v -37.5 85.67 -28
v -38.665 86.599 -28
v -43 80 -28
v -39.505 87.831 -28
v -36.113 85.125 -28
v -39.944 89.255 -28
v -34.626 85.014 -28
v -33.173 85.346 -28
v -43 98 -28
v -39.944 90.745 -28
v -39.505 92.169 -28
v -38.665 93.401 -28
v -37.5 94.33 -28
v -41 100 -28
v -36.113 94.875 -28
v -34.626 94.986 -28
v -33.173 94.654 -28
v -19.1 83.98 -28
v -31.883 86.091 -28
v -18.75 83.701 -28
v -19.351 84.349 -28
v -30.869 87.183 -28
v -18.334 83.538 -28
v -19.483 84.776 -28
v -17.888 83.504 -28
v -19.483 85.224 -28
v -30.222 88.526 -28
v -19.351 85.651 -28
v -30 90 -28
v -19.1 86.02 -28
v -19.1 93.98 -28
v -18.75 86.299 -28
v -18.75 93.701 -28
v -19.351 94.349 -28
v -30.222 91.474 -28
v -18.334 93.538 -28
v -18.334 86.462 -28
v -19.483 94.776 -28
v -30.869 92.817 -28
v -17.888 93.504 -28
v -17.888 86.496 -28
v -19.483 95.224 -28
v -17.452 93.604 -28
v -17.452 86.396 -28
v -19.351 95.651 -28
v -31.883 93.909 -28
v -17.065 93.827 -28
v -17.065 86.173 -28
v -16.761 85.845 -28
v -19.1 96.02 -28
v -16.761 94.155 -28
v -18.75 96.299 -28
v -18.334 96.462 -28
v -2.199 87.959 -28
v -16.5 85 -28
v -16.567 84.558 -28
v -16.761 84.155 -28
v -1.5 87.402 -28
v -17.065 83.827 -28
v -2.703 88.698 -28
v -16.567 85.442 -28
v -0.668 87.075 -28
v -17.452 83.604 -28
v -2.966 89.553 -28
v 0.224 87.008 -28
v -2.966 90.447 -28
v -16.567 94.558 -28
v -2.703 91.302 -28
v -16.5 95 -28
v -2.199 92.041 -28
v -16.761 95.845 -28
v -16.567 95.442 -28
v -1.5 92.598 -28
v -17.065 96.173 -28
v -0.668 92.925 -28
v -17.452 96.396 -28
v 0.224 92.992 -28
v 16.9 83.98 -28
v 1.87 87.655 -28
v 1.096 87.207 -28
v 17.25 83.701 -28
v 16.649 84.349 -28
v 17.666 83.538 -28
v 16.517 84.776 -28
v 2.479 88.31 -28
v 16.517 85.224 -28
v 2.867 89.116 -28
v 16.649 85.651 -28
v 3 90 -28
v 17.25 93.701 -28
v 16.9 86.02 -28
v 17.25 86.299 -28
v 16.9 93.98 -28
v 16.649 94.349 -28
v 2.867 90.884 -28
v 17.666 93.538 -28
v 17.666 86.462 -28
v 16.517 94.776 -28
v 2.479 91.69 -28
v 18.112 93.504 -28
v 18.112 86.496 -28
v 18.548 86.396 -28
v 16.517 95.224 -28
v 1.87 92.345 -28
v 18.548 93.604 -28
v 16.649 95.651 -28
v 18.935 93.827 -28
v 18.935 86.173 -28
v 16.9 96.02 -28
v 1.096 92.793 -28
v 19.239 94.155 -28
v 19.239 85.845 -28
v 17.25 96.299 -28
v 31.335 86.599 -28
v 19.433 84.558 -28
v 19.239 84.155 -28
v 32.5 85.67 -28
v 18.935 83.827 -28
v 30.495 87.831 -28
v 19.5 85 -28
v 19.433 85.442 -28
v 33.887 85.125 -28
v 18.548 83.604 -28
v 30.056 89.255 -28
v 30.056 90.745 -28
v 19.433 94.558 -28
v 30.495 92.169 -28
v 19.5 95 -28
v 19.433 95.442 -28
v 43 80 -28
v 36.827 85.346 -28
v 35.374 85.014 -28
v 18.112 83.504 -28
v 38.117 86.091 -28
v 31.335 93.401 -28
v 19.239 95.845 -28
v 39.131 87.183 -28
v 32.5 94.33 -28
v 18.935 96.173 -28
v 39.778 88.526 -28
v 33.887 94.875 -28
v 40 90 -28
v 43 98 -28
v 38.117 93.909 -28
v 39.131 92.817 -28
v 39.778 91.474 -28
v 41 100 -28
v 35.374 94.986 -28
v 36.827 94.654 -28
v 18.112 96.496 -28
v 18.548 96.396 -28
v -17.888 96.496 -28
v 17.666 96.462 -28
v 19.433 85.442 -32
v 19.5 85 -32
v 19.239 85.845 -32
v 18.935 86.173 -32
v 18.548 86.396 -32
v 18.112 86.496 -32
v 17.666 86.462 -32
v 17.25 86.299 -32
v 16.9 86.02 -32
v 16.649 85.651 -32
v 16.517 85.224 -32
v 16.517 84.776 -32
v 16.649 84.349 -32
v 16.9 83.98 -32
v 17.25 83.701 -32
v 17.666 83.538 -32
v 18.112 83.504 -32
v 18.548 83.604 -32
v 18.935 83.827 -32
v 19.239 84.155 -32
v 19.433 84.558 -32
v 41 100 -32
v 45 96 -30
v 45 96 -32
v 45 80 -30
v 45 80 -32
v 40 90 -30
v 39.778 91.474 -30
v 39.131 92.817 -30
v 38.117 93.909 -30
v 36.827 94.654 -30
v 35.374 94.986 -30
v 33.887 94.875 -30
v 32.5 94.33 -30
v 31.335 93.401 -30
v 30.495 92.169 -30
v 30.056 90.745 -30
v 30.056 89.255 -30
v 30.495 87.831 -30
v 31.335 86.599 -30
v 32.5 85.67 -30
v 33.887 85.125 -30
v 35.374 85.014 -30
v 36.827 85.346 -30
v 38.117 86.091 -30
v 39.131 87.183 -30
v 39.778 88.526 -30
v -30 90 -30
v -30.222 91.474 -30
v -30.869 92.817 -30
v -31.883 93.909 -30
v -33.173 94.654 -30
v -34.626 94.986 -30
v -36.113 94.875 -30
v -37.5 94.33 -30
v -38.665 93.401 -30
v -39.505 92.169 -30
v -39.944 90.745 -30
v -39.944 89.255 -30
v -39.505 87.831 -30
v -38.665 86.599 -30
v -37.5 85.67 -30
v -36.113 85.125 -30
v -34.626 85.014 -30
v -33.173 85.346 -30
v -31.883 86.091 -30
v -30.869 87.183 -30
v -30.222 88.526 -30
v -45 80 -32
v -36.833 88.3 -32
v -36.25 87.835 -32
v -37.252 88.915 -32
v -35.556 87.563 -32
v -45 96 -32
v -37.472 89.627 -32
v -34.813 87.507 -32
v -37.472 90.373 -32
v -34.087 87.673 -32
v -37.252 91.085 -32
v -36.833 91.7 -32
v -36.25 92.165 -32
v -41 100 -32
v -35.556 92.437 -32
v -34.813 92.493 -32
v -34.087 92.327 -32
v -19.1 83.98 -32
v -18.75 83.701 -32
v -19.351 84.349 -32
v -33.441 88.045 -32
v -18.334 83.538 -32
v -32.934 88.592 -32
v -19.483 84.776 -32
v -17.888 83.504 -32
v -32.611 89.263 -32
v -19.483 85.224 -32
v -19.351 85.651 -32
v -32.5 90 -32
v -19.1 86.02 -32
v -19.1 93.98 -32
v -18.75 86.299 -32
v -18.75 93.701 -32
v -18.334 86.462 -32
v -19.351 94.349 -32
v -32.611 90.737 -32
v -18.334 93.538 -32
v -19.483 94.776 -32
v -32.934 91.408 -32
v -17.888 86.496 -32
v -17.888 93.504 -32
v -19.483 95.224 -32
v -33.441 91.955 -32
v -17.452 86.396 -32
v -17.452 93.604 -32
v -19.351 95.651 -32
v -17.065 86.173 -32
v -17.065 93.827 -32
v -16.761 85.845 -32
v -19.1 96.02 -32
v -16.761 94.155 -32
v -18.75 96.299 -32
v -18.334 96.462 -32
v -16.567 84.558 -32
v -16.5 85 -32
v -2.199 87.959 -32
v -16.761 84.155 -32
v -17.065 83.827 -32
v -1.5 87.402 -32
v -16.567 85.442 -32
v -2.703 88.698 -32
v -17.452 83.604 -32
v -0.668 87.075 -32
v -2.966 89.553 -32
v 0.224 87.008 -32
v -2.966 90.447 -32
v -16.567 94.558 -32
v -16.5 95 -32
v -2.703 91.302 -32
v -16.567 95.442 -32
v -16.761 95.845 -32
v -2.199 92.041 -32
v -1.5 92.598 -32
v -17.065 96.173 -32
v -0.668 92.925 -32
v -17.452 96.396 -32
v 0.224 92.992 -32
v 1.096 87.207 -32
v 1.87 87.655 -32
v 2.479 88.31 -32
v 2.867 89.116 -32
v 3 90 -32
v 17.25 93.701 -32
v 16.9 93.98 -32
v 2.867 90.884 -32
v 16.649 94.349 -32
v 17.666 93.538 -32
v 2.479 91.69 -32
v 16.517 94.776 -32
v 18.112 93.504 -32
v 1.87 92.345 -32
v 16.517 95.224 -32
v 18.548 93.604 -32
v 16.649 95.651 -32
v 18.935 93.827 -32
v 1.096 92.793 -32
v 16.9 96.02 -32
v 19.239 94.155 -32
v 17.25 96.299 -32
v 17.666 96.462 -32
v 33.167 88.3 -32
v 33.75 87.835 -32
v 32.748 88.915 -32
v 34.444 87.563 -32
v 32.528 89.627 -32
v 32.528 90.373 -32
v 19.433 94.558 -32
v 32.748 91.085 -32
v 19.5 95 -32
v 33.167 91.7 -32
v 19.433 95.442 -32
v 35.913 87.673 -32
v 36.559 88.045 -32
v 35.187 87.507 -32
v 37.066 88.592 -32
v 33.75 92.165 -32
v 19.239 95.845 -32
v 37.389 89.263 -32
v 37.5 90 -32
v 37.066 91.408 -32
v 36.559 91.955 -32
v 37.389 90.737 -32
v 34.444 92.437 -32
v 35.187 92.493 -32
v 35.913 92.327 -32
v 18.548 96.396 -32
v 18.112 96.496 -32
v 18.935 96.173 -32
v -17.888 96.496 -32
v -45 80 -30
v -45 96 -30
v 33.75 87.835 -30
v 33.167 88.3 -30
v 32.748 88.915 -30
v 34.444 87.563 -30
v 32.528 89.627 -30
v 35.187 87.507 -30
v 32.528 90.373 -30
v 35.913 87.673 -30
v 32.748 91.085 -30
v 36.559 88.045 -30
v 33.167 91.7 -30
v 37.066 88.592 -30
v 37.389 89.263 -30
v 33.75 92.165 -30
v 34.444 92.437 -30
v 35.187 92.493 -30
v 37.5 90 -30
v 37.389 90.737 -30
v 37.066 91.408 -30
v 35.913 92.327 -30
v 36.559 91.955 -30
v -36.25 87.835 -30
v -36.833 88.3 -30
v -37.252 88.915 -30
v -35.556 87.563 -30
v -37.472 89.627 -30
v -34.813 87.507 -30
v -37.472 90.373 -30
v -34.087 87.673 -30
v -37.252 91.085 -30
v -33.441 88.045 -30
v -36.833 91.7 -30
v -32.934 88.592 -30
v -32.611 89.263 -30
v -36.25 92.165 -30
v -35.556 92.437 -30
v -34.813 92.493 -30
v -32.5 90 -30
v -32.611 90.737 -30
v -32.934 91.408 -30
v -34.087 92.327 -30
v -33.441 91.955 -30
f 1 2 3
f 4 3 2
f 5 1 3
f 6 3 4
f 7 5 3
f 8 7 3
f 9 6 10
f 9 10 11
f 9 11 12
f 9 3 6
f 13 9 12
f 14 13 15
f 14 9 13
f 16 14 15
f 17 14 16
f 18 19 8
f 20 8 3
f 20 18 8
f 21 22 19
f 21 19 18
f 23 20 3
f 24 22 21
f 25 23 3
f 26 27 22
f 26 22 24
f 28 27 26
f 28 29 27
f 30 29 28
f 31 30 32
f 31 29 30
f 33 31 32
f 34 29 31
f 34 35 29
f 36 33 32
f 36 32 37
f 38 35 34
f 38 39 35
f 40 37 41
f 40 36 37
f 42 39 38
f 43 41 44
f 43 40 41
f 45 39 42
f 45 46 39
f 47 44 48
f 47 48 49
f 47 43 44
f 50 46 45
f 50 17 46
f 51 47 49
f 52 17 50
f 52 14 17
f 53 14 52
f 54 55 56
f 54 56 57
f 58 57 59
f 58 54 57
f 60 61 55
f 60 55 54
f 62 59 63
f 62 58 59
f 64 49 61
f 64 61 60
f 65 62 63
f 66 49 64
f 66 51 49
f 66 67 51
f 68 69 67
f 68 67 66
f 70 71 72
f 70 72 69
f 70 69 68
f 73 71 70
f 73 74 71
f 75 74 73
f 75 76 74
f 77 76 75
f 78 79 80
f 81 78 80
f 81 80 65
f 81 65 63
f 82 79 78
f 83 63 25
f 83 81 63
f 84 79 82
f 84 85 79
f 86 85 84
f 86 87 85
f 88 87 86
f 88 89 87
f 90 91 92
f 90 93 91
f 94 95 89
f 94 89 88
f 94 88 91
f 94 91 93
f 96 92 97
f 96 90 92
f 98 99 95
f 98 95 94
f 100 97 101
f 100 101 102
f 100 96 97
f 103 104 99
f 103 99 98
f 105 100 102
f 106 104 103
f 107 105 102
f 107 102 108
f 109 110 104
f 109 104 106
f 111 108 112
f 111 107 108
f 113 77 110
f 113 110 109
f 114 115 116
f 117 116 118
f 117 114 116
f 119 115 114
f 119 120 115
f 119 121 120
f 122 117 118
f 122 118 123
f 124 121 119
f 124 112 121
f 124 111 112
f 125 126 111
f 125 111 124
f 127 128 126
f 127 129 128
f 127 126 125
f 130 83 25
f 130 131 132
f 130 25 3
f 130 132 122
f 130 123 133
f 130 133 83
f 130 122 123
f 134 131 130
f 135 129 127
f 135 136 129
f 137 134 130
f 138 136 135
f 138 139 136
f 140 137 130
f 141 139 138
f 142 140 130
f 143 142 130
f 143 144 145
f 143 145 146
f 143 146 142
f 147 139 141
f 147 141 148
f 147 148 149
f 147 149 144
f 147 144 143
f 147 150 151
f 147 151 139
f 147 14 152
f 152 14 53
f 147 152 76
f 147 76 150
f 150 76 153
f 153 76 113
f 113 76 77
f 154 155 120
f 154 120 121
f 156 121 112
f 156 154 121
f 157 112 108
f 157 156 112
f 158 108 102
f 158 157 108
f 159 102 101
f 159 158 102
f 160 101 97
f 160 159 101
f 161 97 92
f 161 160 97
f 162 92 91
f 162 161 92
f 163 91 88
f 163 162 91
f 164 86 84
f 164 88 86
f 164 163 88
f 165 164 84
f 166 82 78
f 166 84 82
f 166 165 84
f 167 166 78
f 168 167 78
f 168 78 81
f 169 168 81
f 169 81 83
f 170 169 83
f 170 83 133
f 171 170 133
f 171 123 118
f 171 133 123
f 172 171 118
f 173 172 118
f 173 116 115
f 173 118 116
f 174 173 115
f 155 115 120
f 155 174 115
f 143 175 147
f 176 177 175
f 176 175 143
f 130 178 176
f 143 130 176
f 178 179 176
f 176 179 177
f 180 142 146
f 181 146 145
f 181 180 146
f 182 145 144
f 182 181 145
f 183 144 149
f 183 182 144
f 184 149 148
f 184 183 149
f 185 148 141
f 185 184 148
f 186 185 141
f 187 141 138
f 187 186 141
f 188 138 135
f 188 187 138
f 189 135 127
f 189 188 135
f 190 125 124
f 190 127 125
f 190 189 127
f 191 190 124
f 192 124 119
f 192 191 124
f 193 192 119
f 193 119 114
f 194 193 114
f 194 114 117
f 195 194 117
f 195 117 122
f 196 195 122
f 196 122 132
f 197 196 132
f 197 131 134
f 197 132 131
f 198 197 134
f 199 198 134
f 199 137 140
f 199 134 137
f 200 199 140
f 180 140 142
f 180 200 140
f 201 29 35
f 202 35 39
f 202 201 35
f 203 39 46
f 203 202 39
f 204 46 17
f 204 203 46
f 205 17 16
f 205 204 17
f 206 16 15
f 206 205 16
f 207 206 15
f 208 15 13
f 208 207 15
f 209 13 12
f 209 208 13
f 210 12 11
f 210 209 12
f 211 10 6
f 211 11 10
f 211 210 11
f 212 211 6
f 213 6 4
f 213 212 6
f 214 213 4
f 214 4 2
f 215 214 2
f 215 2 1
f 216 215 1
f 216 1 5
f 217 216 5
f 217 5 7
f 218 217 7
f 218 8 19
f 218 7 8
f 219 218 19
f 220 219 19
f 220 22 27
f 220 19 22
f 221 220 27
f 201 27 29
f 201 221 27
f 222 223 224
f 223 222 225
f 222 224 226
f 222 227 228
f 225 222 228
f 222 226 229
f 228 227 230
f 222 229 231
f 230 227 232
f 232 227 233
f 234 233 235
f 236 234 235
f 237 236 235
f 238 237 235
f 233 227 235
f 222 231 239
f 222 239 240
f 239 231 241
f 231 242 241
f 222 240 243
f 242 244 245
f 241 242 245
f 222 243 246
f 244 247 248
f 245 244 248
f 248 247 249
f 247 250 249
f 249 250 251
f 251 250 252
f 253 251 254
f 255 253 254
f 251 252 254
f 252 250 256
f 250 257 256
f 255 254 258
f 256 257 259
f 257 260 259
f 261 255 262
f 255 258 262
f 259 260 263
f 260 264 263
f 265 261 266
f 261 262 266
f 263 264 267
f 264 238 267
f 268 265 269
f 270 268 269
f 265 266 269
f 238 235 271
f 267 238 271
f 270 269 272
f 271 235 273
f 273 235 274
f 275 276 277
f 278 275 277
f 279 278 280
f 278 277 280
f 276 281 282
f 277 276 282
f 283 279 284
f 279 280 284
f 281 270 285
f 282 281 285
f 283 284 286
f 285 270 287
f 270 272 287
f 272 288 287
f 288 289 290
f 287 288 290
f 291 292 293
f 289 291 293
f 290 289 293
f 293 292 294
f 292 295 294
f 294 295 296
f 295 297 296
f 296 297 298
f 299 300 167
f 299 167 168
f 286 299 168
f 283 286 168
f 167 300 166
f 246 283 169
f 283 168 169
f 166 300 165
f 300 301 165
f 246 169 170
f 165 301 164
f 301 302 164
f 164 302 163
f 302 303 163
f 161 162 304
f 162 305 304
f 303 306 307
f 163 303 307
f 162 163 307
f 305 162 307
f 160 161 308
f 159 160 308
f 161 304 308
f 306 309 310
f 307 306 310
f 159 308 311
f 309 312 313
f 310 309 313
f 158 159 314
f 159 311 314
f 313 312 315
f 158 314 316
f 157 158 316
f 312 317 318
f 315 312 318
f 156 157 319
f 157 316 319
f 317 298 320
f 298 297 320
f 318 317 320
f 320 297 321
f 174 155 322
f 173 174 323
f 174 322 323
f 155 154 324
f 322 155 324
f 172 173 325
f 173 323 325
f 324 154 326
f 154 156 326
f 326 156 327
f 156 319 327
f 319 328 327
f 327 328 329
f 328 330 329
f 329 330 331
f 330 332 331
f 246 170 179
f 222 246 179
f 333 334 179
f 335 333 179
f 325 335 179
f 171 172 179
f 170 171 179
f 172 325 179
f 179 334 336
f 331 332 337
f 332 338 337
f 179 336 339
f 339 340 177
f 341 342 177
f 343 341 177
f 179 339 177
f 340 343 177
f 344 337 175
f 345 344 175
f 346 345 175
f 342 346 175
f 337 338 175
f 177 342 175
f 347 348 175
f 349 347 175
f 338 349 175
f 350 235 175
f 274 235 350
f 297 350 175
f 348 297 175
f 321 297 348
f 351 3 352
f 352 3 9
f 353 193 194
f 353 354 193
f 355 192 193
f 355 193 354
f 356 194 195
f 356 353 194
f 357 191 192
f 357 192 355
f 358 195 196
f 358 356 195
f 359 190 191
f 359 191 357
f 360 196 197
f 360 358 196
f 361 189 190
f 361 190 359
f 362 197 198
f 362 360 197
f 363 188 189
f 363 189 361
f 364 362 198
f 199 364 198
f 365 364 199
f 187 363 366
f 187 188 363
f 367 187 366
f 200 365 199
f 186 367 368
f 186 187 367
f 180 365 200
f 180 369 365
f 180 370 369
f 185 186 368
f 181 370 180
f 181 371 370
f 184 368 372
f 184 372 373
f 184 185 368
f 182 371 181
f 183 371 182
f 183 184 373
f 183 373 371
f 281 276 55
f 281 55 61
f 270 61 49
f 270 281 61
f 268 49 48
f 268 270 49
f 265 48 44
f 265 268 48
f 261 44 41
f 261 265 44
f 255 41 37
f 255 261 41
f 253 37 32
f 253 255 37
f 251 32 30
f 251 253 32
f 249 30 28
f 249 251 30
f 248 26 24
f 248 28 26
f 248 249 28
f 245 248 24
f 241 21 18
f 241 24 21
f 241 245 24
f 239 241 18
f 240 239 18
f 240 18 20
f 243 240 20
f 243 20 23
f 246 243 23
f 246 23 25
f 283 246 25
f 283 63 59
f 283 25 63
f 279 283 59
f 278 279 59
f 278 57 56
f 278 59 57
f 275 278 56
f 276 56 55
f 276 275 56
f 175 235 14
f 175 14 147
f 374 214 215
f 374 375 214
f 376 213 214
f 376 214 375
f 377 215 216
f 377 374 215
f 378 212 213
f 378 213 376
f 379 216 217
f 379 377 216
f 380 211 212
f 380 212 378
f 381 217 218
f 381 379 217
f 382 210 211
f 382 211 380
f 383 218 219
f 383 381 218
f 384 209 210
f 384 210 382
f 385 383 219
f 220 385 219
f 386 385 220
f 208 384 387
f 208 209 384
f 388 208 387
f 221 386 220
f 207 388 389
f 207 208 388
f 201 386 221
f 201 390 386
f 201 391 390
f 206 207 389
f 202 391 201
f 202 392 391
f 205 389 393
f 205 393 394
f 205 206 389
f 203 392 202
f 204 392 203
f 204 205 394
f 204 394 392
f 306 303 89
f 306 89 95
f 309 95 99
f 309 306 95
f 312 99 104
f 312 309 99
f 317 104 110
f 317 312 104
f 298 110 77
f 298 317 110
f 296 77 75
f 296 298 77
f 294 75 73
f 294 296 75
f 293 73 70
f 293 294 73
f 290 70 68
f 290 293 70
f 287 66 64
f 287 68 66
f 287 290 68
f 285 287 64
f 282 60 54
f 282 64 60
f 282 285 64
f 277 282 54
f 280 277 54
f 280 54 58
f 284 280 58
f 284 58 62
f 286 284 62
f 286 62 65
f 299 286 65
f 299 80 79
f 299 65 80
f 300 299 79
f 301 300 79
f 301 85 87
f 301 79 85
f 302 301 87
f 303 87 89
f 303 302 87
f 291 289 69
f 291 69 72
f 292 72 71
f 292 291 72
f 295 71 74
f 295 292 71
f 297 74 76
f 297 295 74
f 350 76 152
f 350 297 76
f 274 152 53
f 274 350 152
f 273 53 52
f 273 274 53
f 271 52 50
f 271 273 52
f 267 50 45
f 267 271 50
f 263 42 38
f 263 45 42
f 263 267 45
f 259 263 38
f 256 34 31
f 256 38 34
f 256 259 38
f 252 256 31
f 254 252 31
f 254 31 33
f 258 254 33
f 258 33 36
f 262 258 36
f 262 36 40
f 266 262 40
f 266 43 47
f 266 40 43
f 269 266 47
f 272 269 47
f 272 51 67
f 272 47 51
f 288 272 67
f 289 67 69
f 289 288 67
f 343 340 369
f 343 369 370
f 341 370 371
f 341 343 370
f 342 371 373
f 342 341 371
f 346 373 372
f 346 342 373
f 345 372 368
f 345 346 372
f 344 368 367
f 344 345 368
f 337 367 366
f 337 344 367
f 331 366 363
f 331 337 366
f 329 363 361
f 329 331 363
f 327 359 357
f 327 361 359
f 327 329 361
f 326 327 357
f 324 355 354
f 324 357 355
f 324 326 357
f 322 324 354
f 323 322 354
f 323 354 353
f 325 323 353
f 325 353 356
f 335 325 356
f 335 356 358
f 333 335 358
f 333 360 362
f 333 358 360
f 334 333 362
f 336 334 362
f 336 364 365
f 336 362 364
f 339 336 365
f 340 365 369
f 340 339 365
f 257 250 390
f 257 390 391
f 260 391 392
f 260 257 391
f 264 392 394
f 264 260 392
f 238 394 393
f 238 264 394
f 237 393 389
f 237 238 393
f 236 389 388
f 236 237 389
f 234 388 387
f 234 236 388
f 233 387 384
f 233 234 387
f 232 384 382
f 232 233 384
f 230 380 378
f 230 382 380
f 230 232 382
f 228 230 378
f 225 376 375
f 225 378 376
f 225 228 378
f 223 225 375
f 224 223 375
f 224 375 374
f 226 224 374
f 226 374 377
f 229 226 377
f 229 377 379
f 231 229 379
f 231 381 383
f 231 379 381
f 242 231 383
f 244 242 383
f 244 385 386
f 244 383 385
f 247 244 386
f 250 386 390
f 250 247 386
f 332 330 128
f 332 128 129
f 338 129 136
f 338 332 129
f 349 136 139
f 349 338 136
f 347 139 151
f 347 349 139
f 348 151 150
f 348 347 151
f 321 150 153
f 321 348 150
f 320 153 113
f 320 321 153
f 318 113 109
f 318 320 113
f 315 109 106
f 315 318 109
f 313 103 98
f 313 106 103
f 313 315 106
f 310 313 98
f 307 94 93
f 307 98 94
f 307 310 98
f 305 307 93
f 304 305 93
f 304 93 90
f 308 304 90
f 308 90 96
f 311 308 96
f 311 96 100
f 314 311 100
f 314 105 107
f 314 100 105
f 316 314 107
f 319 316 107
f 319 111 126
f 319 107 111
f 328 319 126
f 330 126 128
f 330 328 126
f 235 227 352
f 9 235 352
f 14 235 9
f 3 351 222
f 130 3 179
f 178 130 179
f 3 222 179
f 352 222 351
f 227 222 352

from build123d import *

# Parameters (mm, degrees)
CYLINDER1669_R     = 2.5
CYLINDER1669_DEPTH = 20
CYLINDER1668_R     = 2.5
CYLINDER1668_DEPTH = 20
CYLINDER1667_R     = 5
CYLINDER1667_DEPTH = 5
CYLINDER1666_R     = 5
CYLINDER1666_DEPTH = 5
CYLINDER1647_R     = 1.5
CYLINDER1647_DEPTH = 60
CYLINDER1648_R     = 1.5
CYLINDER1648_DEPTH = 60
CYLINDER1649_R     = 1.5
CYLINDER1649_DEPTH = 60
CYLINDER1646_R     = 1.5
CYLINDER1646_DEPTH = 60
CYLINDER1619_R     = 3
CYLINDER1619_DEPTH = 48
BOX644_W           = 90
BOX644_H           = 20
BOX644_DEPTH       = 4
CHAMFER042_SIZE    = 4
CHAMFER043_SIZE    = 2


with BuildPart() as v_lec1669:
    # Cylinder1669 → Cylinder1669 (new body)
    with BuildSketch(Plane(origin=(-35, 90, -59), x_dir=(1, 0, 0), z_dir=(0, 0, 1))):
        Circle(CYLINDER1669_R)
    extrude(amount=CYLINDER1669_DEPTH)


with BuildPart() as compound819:
    # Cylinder1668 → Cylinder1668 (new body)
    with BuildSketch(Plane(origin=(35, 90, -59), x_dir=(1, 0, 0), z_dir=(0, 0, 1))):
        Circle(CYLINDER1668_R)
    extrude(amount=CYLINDER1668_DEPTH)

    # Compound819: union Válec1669
    add(v_lec1669.part)


with BuildPart() as compound819_1:
    # Compound819 placement: moved
    add(compound819.part.moved(Location((0, 0, 18))))


with BuildPart() as v_lec1667:
    # Cylinder1667 → Cylinder1667 (new body)
    with BuildSketch(Plane(origin=(-35, 90, -59), x_dir=(1, 0, 0), z_dir=(0, 0, 1))):
        Circle(CYLINDER1667_R)
    extrude(amount=CYLINDER1667_DEPTH)


with BuildPart() as compound818:
    # Cylinder1666 → Cylinder1666 (new body)
    with BuildSketch(Plane(origin=(35, 90, -59), x_dir=(1, 0, 0), z_dir=(0, 0, 1))):
        Circle(CYLINDER1666_R)
    extrude(amount=CYLINDER1666_DEPTH)

    # Compound818: union Válec1667
    add(v_lec1667.part)


with BuildPart() as compound818_1:
    # Compound818 placement: moved
    add(compound818.part.moved(Location((0, 0, 29))))


with BuildPart() as v_lec1647:
    # Cylinder1647 → Cylinder1647 (new body)
    with BuildSketch(Plane(origin=(18, 85, -57), x_dir=(1, 0, 0), z_dir=(0, 0, 1))):
        Circle(CYLINDER1647_R)
    extrude(amount=CYLINDER1647_DEPTH)


with BuildPart() as v_lec1648:
    # Cylinder1648 → Cylinder1648 (new body)
    with BuildSketch(Plane(origin=(-18, 85, -57), x_dir=(1, 0, 0), z_dir=(0, 0, 1))):
        Circle(CYLINDER1648_R)
    extrude(amount=CYLINDER1648_DEPTH)


with BuildPart() as v_lec1649:
    # Cylinder1649 → Cylinder1649 (new body)
    with BuildSketch(Plane(origin=(-18, 95, -57), x_dir=(1, 0, 0), z_dir=(0, 0, 1))):
        Circle(CYLINDER1649_R)
    extrude(amount=CYLINDER1649_DEPTH)


with BuildPart() as compound812:
    # Cylinder1646 → Cylinder1646 (new body)
    with BuildSketch(Plane(origin=(18, 95, -57), x_dir=(1, 0, 0), z_dir=(0, 0, 1))):
        Circle(CYLINDER1646_R)
    extrude(amount=CYLINDER1646_DEPTH)

    # Compound812: union Válec1647, Válec1648, Válec1649
    add(v_lec1647.part)
    add(v_lec1648.part)
    add(v_lec1649.part)


with BuildPart() as v_lec1619:
    # Cylinder1619 → Cylinder1619 (new body)
    with BuildSketch(Plane(origin=(0, 90, -55), x_dir=(1, 0, 0), z_dir=(0, 0, 1))):
        Circle(CYLINDER1619_R)
    extrude(amount=CYLINDER1619_DEPTH)


with BuildPart() as chamfer043:
    # Box644 → Box644 (new body)
    with BuildSketch(Plane(origin=(-45, 80, -32), x_dir=(1, 0, 0), z_dir=(0, 0, 1))):
        with Locations((45, 10)):
            Rectangle(BOX644_W, BOX644_H)
    extrude(amount=BOX644_DEPTH)

    # Cut313: cut Válec1619
    add(v_lec1619.part, mode=Mode.SUBTRACT)

    # Cut324: cut Compound812
    add(compound812.part, mode=Mode.SUBTRACT)

    # Cut331: cut Compound818
    add(compound818_1.part, mode=Mode.SUBTRACT)

    # Cut332: cut Compound819
    add(compound819_1.part, mode=Mode.SUBTRACT)

    # Chamfer042
    chamfer042_edges = [chamfer043.edges().sort_by_distance(p)[0] for p in [
        (-45, 100, -30),
        (45, 100, -30),
    ]]
    chamfer(chamfer042_edges, length=CHAMFER042_SIZE)

    # Chamfer043
    chamfer043_edges = [chamfer043.edges().sort_by_distance(p)[0] for p in [
        (-45, 88, -28),
        (45, 88, -28),
    ]]
    chamfer(chamfer043_edges, length=CHAMFER043_SIZE)


solid = chamfer043.part
